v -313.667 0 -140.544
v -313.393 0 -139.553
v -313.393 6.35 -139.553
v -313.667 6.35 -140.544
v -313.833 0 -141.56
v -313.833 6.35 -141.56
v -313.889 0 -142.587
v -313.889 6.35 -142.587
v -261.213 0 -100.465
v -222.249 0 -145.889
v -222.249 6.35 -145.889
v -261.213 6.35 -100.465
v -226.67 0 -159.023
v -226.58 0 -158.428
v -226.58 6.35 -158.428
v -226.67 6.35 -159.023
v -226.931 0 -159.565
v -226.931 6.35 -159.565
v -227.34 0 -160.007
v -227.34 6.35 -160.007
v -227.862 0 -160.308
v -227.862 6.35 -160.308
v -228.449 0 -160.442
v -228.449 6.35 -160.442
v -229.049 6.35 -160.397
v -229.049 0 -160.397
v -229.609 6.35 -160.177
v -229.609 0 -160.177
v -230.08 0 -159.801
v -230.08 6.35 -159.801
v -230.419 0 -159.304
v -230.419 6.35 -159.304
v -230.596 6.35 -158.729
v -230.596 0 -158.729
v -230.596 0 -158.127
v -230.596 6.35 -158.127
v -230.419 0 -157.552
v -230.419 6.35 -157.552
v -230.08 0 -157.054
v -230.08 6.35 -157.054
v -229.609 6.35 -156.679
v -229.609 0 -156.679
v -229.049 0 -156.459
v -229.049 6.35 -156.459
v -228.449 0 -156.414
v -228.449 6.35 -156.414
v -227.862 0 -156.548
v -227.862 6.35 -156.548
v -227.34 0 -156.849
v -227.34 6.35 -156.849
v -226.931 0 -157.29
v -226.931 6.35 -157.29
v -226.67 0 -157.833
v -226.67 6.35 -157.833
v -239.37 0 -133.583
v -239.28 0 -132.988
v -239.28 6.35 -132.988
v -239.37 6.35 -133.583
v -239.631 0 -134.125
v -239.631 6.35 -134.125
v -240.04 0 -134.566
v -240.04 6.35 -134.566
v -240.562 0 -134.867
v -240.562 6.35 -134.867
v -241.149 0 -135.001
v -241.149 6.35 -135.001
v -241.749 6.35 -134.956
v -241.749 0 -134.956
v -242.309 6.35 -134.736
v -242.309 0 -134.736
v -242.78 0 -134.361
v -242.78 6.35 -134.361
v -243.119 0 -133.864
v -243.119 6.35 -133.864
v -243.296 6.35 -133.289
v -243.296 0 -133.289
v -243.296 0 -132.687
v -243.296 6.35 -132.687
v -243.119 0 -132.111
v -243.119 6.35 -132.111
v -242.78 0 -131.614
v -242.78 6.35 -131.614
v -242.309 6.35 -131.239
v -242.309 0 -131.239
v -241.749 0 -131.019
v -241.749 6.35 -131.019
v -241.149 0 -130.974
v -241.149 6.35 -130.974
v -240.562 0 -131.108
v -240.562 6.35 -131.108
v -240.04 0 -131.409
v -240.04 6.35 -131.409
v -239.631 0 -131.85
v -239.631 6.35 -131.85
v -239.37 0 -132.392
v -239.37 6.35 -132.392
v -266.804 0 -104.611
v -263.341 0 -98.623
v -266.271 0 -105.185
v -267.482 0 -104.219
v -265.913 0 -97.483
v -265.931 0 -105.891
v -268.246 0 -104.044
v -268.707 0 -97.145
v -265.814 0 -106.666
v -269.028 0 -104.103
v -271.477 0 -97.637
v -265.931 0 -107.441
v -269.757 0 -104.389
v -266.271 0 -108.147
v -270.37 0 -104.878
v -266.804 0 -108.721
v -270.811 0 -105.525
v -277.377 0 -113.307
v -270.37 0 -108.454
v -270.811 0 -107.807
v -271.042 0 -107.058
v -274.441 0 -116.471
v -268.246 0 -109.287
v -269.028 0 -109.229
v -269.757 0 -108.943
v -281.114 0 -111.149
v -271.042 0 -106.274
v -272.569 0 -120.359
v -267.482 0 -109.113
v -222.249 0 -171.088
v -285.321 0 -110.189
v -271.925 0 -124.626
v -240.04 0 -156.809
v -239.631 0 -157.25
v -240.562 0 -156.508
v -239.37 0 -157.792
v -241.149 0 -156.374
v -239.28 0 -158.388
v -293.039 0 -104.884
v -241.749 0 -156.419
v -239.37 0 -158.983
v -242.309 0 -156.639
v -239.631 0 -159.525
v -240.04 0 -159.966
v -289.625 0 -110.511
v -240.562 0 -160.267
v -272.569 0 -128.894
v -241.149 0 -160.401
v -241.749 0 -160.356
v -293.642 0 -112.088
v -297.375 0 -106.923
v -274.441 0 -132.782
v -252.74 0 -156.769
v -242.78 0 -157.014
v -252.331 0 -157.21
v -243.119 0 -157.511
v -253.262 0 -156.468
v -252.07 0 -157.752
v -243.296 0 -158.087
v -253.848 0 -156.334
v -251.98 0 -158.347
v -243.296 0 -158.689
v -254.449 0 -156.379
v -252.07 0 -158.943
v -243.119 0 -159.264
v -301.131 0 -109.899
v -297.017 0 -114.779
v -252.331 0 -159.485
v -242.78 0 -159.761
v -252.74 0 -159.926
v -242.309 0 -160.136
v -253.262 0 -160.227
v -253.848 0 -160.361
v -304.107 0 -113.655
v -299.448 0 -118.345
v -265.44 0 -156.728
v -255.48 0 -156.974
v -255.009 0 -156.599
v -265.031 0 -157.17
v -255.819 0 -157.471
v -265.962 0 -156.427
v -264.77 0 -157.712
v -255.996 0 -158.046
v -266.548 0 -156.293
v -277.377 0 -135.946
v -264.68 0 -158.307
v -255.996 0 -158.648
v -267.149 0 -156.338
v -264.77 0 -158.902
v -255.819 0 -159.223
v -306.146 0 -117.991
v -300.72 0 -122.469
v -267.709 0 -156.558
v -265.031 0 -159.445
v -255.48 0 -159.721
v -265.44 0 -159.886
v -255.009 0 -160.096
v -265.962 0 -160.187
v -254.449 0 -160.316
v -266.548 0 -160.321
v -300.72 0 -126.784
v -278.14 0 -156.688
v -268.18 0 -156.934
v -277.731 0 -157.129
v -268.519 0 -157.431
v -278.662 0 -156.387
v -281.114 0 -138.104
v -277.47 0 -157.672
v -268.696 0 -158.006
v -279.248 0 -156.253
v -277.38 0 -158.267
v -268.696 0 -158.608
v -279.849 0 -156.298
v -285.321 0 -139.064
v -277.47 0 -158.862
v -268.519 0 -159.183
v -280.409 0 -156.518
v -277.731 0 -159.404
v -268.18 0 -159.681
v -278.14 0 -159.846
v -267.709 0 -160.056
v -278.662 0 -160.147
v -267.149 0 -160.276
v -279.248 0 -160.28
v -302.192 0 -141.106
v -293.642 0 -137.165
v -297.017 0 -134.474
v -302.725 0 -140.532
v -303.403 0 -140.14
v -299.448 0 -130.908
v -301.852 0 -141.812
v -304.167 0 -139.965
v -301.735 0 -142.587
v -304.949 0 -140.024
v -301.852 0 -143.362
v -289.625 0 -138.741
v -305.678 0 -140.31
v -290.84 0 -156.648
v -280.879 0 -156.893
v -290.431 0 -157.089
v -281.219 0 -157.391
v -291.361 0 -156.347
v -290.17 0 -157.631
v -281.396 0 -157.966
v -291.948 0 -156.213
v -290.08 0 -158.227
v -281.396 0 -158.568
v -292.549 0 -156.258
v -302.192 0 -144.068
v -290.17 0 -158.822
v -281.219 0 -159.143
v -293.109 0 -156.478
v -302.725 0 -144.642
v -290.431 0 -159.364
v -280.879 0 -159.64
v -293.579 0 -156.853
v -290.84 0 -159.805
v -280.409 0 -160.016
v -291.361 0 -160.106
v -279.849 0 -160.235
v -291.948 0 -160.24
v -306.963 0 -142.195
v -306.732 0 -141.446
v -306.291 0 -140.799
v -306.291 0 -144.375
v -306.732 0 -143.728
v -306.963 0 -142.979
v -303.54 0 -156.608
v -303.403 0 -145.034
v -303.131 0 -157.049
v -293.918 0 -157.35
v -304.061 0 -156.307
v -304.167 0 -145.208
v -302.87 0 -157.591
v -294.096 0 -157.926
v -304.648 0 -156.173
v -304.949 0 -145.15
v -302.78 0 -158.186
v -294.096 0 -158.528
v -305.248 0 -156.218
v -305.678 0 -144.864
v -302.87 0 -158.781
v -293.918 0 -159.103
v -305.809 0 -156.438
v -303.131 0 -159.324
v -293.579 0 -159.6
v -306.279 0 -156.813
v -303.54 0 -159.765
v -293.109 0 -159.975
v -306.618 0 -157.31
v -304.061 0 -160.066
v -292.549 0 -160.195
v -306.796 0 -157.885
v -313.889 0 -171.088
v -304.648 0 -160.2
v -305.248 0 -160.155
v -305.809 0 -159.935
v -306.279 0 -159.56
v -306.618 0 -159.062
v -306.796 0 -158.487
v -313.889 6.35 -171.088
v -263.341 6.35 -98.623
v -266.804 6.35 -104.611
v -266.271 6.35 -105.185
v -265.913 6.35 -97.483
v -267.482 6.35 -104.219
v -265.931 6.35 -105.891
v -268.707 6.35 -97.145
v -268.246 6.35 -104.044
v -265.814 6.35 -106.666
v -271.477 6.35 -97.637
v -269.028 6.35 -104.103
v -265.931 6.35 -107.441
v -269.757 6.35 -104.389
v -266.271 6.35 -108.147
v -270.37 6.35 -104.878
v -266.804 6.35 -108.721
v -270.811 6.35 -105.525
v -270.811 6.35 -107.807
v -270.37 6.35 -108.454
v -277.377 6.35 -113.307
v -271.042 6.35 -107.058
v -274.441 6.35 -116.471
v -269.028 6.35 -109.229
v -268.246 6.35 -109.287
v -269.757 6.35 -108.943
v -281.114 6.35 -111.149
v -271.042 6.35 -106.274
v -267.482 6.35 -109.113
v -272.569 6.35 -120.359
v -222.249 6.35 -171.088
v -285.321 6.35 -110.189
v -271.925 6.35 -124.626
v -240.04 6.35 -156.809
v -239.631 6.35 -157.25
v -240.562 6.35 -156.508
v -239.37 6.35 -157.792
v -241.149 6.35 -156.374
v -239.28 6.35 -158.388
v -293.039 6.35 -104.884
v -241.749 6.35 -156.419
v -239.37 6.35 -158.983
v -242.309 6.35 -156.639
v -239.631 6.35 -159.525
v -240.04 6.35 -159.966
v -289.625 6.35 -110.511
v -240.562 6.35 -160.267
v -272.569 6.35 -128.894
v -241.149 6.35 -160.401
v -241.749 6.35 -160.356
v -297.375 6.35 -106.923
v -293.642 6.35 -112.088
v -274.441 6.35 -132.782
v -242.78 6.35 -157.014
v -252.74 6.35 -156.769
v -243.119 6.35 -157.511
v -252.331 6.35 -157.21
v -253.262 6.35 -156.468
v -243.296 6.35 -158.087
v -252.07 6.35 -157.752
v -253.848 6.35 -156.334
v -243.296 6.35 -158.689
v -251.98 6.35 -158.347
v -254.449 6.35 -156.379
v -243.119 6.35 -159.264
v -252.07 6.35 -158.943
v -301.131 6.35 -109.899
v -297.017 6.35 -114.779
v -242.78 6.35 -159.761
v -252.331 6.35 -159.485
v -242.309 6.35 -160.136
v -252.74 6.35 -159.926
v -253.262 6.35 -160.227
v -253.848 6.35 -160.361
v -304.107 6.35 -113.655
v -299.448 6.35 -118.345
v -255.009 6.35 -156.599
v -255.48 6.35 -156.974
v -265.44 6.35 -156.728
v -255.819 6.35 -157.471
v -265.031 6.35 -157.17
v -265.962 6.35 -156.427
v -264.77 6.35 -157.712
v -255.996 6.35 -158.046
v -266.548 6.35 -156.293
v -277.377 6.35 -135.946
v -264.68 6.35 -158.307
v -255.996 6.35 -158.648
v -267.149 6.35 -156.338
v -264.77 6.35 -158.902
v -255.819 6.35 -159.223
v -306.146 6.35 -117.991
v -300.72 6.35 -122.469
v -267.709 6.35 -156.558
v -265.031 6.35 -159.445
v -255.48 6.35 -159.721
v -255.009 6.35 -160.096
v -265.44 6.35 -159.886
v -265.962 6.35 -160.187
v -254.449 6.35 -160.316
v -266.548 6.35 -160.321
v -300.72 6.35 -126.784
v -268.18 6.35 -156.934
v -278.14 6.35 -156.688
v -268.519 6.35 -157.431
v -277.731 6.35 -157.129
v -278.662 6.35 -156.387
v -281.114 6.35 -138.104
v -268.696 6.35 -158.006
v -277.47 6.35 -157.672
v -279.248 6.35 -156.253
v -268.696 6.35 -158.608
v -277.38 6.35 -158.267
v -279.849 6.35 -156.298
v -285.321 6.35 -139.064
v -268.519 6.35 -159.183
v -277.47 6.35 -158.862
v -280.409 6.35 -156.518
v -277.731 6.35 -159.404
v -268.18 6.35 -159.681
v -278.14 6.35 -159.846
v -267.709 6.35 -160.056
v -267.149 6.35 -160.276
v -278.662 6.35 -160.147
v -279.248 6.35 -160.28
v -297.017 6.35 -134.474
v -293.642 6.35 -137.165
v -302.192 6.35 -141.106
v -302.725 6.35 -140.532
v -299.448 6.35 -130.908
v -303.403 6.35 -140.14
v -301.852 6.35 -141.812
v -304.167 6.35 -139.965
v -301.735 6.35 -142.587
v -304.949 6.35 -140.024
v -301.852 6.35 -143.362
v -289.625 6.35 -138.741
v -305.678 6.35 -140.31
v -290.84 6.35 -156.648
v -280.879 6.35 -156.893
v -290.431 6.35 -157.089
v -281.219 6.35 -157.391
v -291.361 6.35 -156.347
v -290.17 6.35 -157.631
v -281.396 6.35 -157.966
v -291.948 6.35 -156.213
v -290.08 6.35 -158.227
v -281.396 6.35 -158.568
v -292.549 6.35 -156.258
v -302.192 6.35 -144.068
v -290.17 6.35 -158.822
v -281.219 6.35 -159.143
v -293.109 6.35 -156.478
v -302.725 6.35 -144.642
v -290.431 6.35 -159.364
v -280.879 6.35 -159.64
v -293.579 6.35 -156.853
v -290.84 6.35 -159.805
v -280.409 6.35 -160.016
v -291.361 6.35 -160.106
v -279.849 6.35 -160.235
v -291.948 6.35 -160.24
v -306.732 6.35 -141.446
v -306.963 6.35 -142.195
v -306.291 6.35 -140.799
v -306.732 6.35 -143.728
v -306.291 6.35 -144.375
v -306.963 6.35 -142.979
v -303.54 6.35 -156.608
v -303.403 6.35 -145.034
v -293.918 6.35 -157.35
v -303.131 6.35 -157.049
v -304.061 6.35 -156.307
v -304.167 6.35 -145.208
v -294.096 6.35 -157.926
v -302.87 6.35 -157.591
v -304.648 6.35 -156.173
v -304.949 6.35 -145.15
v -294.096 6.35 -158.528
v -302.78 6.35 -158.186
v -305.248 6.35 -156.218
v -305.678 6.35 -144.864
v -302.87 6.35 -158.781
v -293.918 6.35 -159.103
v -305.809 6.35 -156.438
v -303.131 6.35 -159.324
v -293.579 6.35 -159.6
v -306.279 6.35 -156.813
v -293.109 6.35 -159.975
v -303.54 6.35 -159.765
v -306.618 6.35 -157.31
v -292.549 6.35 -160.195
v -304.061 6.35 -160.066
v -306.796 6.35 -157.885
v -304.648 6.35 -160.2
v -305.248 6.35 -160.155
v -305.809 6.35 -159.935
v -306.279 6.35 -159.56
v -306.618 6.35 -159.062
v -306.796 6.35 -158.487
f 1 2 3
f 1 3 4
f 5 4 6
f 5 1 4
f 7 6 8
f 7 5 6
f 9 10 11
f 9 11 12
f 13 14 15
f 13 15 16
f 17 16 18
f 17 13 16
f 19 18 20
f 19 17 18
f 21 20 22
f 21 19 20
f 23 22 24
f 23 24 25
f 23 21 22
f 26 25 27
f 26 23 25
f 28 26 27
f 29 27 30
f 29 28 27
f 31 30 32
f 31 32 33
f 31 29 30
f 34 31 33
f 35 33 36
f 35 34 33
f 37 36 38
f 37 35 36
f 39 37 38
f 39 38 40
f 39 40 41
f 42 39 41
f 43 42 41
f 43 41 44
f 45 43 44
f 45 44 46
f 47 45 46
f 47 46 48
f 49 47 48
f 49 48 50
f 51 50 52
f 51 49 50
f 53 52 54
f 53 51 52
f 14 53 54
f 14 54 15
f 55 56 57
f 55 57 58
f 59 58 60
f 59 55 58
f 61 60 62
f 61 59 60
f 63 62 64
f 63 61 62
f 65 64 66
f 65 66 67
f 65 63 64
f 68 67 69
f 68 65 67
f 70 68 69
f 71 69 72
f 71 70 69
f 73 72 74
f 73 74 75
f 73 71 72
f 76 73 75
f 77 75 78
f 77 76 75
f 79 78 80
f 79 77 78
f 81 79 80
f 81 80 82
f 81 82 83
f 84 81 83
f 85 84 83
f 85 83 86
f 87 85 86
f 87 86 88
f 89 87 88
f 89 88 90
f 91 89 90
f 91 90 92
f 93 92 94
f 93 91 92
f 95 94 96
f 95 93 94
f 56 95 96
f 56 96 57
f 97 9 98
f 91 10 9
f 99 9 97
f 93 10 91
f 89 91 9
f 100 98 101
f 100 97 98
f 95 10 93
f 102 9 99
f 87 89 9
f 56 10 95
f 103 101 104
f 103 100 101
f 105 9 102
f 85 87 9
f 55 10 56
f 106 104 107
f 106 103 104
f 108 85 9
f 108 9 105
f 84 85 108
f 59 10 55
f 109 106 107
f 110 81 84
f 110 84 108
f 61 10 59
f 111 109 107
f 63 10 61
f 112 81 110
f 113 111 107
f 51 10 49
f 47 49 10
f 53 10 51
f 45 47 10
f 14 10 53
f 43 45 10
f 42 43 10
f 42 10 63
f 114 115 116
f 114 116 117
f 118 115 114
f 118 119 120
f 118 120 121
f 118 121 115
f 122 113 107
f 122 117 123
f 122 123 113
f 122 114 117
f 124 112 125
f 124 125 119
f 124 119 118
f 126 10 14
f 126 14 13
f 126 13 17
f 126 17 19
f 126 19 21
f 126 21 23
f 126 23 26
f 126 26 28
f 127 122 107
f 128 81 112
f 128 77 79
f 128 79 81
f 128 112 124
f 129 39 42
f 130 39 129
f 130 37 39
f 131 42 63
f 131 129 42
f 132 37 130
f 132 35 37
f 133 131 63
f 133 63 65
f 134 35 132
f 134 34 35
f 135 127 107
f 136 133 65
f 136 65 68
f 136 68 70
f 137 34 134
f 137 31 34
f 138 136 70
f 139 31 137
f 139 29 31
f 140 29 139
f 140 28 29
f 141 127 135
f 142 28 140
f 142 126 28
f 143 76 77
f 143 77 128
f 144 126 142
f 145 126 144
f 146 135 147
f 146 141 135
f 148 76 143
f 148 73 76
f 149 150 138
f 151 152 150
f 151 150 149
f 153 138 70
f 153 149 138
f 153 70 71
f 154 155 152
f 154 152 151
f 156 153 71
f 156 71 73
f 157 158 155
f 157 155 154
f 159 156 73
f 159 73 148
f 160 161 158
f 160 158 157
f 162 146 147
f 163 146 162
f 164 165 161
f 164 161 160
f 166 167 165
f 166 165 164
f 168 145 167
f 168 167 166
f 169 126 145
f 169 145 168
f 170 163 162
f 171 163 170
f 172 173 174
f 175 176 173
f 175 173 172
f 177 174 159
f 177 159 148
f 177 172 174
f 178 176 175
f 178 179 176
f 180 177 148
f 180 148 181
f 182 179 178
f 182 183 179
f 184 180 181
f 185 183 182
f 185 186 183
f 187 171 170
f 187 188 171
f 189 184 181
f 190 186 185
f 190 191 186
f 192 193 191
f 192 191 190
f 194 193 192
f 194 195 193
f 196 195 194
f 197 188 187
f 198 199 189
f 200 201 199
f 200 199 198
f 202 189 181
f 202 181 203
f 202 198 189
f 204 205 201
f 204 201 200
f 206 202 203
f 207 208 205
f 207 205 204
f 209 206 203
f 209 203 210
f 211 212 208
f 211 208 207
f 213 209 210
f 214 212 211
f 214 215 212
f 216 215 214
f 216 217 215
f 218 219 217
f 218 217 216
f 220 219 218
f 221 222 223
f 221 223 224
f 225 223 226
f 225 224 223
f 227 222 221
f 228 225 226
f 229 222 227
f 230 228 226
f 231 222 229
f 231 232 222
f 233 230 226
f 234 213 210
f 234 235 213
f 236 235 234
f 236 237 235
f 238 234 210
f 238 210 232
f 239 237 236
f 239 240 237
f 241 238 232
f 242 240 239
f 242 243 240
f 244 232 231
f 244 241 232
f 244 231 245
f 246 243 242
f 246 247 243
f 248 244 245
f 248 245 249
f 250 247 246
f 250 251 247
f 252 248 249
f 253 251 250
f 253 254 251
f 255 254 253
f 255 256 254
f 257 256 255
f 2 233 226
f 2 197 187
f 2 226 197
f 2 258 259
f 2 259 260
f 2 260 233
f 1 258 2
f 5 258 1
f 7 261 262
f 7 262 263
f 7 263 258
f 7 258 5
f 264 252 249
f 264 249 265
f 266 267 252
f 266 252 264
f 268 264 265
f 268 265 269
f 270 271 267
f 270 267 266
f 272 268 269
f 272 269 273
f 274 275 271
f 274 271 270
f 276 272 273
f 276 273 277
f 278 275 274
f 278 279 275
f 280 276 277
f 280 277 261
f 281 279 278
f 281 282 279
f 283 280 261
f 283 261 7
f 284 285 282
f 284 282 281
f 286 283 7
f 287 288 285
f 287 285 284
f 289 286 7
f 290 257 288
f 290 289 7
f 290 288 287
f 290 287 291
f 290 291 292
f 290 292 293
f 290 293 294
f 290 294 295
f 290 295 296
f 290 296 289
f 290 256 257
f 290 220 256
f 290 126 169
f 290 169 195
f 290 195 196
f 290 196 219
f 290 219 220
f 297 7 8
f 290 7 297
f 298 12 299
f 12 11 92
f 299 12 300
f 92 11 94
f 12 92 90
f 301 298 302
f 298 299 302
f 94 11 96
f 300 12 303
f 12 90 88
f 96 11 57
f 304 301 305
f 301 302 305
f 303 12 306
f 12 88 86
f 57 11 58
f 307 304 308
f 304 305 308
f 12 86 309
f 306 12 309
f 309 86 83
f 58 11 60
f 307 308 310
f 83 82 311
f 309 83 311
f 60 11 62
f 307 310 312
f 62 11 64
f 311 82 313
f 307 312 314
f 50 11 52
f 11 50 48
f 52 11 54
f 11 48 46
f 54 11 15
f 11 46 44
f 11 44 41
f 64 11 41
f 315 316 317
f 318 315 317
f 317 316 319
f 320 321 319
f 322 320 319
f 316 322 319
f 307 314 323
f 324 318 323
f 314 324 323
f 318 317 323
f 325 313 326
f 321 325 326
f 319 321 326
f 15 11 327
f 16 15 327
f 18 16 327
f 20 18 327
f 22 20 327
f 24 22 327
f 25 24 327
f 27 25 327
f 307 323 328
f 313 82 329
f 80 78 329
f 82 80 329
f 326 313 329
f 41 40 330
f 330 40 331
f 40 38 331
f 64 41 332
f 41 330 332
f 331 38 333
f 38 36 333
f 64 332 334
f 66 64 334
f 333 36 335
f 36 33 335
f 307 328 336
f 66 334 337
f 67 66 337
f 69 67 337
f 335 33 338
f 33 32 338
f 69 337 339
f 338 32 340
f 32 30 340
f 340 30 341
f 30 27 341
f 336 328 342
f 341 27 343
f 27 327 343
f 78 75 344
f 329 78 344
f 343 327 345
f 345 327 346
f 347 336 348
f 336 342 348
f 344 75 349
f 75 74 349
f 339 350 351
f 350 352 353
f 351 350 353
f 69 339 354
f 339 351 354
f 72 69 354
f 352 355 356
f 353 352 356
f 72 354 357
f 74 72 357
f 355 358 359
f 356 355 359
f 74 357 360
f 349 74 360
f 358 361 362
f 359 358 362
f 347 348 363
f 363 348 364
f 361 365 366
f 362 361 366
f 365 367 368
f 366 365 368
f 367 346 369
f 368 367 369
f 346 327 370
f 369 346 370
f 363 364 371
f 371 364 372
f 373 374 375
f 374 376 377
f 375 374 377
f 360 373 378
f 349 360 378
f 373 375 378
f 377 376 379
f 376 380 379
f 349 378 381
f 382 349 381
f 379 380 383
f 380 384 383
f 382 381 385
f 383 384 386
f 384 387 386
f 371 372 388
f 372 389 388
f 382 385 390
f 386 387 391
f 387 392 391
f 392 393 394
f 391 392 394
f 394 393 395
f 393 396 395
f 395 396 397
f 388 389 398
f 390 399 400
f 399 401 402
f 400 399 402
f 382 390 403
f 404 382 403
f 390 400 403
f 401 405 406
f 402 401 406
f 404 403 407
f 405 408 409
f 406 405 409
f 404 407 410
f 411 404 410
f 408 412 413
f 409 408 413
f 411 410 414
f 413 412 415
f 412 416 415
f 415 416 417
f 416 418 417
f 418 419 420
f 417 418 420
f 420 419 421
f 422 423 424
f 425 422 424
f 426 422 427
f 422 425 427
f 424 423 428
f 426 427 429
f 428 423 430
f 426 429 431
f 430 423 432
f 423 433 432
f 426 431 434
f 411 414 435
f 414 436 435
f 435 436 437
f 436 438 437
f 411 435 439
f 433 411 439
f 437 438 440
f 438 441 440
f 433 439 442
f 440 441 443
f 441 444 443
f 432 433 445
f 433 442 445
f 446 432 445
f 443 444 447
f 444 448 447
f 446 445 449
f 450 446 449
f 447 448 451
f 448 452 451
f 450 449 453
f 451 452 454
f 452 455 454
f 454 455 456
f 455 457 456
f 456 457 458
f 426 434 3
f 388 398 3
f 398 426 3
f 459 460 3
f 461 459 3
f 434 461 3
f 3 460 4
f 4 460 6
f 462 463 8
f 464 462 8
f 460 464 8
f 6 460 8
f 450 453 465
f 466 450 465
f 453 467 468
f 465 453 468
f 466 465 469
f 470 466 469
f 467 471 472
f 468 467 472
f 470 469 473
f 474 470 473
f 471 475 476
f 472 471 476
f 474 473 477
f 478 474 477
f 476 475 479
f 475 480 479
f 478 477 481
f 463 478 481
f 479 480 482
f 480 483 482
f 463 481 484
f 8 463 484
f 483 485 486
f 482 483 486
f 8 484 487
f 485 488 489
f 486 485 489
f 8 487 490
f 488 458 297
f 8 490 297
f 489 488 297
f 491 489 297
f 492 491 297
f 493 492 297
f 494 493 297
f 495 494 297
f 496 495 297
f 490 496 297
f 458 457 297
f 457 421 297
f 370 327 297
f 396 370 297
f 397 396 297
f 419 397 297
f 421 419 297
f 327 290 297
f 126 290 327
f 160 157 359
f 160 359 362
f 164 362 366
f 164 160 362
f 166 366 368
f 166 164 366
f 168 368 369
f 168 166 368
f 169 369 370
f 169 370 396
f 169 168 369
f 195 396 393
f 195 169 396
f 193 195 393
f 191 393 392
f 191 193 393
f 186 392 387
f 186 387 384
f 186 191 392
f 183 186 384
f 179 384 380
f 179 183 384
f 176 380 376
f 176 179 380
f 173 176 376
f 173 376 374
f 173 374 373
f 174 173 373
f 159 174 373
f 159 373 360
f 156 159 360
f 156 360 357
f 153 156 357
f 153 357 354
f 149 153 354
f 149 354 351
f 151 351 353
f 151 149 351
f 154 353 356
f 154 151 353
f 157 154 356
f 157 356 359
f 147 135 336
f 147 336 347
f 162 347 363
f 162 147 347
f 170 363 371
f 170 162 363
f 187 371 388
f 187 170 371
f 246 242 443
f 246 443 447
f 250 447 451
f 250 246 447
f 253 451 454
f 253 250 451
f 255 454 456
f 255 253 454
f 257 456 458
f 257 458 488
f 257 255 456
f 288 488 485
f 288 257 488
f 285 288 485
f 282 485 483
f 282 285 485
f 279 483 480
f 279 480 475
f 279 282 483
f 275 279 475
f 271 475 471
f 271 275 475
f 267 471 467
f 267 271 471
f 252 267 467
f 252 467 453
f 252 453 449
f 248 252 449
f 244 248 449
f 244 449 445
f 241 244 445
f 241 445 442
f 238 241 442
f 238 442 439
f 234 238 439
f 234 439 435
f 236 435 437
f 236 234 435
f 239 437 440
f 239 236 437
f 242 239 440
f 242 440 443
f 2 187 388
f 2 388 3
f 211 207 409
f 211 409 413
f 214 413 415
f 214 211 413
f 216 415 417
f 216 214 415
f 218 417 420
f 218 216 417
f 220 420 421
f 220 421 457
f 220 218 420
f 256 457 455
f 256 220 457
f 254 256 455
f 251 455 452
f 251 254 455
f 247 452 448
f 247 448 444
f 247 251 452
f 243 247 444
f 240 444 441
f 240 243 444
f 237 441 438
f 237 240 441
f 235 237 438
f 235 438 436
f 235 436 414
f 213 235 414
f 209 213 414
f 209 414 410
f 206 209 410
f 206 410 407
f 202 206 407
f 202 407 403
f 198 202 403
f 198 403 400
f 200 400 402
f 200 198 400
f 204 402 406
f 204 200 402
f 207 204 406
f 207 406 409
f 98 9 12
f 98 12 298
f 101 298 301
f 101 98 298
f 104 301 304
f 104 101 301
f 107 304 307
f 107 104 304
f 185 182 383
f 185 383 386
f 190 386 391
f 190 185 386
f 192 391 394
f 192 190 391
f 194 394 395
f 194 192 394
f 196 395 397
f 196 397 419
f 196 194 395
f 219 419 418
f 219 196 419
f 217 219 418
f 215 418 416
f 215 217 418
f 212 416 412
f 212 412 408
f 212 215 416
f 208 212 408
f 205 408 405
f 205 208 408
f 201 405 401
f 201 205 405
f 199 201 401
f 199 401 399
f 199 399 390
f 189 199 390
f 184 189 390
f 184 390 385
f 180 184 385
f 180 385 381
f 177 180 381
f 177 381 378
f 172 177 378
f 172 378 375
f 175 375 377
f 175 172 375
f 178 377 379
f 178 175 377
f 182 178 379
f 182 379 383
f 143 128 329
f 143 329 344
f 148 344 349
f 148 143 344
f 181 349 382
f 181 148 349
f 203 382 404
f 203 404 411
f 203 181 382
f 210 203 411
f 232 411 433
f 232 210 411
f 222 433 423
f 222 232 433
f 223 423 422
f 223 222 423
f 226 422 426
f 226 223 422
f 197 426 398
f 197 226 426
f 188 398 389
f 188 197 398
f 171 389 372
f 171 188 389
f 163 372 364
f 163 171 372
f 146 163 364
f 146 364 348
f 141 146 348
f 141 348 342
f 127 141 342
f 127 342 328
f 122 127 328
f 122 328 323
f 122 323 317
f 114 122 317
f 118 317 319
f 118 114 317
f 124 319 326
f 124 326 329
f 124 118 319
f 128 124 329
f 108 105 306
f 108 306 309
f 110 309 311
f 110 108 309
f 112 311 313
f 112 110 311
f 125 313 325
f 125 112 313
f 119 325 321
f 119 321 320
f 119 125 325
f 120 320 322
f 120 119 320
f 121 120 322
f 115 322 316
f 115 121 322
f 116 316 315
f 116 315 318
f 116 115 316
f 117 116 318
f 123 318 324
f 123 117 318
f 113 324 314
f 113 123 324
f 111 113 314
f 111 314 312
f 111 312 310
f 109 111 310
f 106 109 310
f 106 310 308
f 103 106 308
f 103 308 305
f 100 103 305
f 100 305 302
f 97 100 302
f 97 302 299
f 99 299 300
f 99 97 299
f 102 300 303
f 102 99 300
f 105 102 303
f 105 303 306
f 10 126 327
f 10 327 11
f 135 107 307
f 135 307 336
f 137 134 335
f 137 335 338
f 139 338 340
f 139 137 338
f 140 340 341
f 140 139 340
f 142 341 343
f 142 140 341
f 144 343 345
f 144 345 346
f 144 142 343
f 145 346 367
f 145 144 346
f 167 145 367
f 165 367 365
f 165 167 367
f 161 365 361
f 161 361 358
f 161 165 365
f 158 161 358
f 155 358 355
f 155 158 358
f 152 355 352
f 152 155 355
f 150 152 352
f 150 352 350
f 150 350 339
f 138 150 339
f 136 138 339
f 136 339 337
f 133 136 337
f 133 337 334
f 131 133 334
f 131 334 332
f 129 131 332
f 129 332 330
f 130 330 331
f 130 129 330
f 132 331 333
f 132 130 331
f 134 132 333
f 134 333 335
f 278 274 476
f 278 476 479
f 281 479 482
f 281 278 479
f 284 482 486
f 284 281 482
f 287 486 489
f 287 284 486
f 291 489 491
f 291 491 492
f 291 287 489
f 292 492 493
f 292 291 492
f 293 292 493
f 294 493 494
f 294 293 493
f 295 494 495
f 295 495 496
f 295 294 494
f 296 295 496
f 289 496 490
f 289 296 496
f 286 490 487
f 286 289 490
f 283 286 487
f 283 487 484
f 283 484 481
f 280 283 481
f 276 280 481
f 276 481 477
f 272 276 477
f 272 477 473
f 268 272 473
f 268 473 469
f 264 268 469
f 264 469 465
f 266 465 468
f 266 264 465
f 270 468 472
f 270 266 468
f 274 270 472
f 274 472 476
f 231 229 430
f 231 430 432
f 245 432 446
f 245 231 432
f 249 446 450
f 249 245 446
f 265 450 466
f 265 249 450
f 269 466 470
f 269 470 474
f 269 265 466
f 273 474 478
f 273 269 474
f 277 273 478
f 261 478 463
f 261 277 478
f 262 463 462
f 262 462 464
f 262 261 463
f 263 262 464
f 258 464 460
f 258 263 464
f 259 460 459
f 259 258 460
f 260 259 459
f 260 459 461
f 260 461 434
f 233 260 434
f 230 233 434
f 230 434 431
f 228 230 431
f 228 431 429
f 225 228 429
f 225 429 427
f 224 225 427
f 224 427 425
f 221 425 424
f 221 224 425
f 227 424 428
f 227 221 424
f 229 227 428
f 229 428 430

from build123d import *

# Parameters (mm, degrees)
SKETCH1_R           = 2.0193
SKETCH1_R_2         = 14.478
SKETCH1_R_3         = 2.6289
BOSS_EXTRUDE1_DEPTH = 6.35


with BuildPart() as part:
    # Sketch1 → Boss-Extrude1 (new body)
    with BuildSketch(Plane(origin=(0, 0, 0), x_dir=(1, 0, 0), z_dir=(0, 1, 0))):
        with BuildLine():
            Line((-313.888905321, 171.087609001), (-222.249489346, 171.087609001))
            Line((-222.249489346, 171.087609001), (-222.249489346, 145.888937334))
            Line((-222.249489346, 145.888937334), (-261.213202804, 100.464511352))
            ThreePointArc((-261.213202804, 100.464511352), (-265.91335193, 97.482933567), (-271.477290762, 97.637181964))
            Line((-271.477290762, 97.637181964), (-293.038636115, 104.883600221))
            ThreePointArc((-293.038636115, 104.883600221), (-301.131013118, 109.898805053), (-306.14621795, 117.991182056))
            Line((-306.14621795, 117.991182056), (-313.392636207, 139.552527409))
            ThreePointArc((-313.392636207, 139.552527409), (-313.764019328, 141.049575419), (-313.888905321, 142.586937334))
            Line((-313.888905321, 142.586937334), (-313.888905321, 171.087609001))
        make_face()
        with Locations((-228.599489346, 158.427874667)):
            Circle(SKETCH1_R, mode=Mode.SUBTRACT)
        with Locations((-241.299425514, 158.387609001)):
            Circle(SKETCH1_R, mode=Mode.SUBTRACT)
        with Locations((-253.999361682, 158.347343334)):
            Circle(SKETCH1_R, mode=Mode.SUBTRACT)
        with Locations((-266.69929785, 158.307077667)):
            Circle(SKETCH1_R, mode=Mode.SUBTRACT)
        with Locations((-279.399234018, 158.266812001)):
            Circle(SKETCH1_R, mode=Mode.SUBTRACT)
        with Locations((-292.099170186, 158.226546334)):
            Circle(SKETCH1_R, mode=Mode.SUBTRACT)
        with Locations((-304.799106355, 158.186280667)):
            Circle(SKETCH1_R, mode=Mode.SUBTRACT)
        with Locations((-286.403393079, 124.626425091)):
            Circle(SKETCH1_R_2, mode=Mode.SUBTRACT)
        with Locations((-268.442880837, 106.665912849)):
            Circle(SKETCH1_R_3, mode=Mode.SUBTRACT)
        with Locations((-304.363905321, 142.586937334)):
            Circle(SKETCH1_R_3, mode=Mode.SUBTRACT)
        with Locations((-241.299425514, 132.987609001)):
            Circle(SKETCH1_R, mode=Mode.SUBTRACT)
    extrude(amount=BOSS_EXTRUDE1_DEPTH)


solid = part.part
